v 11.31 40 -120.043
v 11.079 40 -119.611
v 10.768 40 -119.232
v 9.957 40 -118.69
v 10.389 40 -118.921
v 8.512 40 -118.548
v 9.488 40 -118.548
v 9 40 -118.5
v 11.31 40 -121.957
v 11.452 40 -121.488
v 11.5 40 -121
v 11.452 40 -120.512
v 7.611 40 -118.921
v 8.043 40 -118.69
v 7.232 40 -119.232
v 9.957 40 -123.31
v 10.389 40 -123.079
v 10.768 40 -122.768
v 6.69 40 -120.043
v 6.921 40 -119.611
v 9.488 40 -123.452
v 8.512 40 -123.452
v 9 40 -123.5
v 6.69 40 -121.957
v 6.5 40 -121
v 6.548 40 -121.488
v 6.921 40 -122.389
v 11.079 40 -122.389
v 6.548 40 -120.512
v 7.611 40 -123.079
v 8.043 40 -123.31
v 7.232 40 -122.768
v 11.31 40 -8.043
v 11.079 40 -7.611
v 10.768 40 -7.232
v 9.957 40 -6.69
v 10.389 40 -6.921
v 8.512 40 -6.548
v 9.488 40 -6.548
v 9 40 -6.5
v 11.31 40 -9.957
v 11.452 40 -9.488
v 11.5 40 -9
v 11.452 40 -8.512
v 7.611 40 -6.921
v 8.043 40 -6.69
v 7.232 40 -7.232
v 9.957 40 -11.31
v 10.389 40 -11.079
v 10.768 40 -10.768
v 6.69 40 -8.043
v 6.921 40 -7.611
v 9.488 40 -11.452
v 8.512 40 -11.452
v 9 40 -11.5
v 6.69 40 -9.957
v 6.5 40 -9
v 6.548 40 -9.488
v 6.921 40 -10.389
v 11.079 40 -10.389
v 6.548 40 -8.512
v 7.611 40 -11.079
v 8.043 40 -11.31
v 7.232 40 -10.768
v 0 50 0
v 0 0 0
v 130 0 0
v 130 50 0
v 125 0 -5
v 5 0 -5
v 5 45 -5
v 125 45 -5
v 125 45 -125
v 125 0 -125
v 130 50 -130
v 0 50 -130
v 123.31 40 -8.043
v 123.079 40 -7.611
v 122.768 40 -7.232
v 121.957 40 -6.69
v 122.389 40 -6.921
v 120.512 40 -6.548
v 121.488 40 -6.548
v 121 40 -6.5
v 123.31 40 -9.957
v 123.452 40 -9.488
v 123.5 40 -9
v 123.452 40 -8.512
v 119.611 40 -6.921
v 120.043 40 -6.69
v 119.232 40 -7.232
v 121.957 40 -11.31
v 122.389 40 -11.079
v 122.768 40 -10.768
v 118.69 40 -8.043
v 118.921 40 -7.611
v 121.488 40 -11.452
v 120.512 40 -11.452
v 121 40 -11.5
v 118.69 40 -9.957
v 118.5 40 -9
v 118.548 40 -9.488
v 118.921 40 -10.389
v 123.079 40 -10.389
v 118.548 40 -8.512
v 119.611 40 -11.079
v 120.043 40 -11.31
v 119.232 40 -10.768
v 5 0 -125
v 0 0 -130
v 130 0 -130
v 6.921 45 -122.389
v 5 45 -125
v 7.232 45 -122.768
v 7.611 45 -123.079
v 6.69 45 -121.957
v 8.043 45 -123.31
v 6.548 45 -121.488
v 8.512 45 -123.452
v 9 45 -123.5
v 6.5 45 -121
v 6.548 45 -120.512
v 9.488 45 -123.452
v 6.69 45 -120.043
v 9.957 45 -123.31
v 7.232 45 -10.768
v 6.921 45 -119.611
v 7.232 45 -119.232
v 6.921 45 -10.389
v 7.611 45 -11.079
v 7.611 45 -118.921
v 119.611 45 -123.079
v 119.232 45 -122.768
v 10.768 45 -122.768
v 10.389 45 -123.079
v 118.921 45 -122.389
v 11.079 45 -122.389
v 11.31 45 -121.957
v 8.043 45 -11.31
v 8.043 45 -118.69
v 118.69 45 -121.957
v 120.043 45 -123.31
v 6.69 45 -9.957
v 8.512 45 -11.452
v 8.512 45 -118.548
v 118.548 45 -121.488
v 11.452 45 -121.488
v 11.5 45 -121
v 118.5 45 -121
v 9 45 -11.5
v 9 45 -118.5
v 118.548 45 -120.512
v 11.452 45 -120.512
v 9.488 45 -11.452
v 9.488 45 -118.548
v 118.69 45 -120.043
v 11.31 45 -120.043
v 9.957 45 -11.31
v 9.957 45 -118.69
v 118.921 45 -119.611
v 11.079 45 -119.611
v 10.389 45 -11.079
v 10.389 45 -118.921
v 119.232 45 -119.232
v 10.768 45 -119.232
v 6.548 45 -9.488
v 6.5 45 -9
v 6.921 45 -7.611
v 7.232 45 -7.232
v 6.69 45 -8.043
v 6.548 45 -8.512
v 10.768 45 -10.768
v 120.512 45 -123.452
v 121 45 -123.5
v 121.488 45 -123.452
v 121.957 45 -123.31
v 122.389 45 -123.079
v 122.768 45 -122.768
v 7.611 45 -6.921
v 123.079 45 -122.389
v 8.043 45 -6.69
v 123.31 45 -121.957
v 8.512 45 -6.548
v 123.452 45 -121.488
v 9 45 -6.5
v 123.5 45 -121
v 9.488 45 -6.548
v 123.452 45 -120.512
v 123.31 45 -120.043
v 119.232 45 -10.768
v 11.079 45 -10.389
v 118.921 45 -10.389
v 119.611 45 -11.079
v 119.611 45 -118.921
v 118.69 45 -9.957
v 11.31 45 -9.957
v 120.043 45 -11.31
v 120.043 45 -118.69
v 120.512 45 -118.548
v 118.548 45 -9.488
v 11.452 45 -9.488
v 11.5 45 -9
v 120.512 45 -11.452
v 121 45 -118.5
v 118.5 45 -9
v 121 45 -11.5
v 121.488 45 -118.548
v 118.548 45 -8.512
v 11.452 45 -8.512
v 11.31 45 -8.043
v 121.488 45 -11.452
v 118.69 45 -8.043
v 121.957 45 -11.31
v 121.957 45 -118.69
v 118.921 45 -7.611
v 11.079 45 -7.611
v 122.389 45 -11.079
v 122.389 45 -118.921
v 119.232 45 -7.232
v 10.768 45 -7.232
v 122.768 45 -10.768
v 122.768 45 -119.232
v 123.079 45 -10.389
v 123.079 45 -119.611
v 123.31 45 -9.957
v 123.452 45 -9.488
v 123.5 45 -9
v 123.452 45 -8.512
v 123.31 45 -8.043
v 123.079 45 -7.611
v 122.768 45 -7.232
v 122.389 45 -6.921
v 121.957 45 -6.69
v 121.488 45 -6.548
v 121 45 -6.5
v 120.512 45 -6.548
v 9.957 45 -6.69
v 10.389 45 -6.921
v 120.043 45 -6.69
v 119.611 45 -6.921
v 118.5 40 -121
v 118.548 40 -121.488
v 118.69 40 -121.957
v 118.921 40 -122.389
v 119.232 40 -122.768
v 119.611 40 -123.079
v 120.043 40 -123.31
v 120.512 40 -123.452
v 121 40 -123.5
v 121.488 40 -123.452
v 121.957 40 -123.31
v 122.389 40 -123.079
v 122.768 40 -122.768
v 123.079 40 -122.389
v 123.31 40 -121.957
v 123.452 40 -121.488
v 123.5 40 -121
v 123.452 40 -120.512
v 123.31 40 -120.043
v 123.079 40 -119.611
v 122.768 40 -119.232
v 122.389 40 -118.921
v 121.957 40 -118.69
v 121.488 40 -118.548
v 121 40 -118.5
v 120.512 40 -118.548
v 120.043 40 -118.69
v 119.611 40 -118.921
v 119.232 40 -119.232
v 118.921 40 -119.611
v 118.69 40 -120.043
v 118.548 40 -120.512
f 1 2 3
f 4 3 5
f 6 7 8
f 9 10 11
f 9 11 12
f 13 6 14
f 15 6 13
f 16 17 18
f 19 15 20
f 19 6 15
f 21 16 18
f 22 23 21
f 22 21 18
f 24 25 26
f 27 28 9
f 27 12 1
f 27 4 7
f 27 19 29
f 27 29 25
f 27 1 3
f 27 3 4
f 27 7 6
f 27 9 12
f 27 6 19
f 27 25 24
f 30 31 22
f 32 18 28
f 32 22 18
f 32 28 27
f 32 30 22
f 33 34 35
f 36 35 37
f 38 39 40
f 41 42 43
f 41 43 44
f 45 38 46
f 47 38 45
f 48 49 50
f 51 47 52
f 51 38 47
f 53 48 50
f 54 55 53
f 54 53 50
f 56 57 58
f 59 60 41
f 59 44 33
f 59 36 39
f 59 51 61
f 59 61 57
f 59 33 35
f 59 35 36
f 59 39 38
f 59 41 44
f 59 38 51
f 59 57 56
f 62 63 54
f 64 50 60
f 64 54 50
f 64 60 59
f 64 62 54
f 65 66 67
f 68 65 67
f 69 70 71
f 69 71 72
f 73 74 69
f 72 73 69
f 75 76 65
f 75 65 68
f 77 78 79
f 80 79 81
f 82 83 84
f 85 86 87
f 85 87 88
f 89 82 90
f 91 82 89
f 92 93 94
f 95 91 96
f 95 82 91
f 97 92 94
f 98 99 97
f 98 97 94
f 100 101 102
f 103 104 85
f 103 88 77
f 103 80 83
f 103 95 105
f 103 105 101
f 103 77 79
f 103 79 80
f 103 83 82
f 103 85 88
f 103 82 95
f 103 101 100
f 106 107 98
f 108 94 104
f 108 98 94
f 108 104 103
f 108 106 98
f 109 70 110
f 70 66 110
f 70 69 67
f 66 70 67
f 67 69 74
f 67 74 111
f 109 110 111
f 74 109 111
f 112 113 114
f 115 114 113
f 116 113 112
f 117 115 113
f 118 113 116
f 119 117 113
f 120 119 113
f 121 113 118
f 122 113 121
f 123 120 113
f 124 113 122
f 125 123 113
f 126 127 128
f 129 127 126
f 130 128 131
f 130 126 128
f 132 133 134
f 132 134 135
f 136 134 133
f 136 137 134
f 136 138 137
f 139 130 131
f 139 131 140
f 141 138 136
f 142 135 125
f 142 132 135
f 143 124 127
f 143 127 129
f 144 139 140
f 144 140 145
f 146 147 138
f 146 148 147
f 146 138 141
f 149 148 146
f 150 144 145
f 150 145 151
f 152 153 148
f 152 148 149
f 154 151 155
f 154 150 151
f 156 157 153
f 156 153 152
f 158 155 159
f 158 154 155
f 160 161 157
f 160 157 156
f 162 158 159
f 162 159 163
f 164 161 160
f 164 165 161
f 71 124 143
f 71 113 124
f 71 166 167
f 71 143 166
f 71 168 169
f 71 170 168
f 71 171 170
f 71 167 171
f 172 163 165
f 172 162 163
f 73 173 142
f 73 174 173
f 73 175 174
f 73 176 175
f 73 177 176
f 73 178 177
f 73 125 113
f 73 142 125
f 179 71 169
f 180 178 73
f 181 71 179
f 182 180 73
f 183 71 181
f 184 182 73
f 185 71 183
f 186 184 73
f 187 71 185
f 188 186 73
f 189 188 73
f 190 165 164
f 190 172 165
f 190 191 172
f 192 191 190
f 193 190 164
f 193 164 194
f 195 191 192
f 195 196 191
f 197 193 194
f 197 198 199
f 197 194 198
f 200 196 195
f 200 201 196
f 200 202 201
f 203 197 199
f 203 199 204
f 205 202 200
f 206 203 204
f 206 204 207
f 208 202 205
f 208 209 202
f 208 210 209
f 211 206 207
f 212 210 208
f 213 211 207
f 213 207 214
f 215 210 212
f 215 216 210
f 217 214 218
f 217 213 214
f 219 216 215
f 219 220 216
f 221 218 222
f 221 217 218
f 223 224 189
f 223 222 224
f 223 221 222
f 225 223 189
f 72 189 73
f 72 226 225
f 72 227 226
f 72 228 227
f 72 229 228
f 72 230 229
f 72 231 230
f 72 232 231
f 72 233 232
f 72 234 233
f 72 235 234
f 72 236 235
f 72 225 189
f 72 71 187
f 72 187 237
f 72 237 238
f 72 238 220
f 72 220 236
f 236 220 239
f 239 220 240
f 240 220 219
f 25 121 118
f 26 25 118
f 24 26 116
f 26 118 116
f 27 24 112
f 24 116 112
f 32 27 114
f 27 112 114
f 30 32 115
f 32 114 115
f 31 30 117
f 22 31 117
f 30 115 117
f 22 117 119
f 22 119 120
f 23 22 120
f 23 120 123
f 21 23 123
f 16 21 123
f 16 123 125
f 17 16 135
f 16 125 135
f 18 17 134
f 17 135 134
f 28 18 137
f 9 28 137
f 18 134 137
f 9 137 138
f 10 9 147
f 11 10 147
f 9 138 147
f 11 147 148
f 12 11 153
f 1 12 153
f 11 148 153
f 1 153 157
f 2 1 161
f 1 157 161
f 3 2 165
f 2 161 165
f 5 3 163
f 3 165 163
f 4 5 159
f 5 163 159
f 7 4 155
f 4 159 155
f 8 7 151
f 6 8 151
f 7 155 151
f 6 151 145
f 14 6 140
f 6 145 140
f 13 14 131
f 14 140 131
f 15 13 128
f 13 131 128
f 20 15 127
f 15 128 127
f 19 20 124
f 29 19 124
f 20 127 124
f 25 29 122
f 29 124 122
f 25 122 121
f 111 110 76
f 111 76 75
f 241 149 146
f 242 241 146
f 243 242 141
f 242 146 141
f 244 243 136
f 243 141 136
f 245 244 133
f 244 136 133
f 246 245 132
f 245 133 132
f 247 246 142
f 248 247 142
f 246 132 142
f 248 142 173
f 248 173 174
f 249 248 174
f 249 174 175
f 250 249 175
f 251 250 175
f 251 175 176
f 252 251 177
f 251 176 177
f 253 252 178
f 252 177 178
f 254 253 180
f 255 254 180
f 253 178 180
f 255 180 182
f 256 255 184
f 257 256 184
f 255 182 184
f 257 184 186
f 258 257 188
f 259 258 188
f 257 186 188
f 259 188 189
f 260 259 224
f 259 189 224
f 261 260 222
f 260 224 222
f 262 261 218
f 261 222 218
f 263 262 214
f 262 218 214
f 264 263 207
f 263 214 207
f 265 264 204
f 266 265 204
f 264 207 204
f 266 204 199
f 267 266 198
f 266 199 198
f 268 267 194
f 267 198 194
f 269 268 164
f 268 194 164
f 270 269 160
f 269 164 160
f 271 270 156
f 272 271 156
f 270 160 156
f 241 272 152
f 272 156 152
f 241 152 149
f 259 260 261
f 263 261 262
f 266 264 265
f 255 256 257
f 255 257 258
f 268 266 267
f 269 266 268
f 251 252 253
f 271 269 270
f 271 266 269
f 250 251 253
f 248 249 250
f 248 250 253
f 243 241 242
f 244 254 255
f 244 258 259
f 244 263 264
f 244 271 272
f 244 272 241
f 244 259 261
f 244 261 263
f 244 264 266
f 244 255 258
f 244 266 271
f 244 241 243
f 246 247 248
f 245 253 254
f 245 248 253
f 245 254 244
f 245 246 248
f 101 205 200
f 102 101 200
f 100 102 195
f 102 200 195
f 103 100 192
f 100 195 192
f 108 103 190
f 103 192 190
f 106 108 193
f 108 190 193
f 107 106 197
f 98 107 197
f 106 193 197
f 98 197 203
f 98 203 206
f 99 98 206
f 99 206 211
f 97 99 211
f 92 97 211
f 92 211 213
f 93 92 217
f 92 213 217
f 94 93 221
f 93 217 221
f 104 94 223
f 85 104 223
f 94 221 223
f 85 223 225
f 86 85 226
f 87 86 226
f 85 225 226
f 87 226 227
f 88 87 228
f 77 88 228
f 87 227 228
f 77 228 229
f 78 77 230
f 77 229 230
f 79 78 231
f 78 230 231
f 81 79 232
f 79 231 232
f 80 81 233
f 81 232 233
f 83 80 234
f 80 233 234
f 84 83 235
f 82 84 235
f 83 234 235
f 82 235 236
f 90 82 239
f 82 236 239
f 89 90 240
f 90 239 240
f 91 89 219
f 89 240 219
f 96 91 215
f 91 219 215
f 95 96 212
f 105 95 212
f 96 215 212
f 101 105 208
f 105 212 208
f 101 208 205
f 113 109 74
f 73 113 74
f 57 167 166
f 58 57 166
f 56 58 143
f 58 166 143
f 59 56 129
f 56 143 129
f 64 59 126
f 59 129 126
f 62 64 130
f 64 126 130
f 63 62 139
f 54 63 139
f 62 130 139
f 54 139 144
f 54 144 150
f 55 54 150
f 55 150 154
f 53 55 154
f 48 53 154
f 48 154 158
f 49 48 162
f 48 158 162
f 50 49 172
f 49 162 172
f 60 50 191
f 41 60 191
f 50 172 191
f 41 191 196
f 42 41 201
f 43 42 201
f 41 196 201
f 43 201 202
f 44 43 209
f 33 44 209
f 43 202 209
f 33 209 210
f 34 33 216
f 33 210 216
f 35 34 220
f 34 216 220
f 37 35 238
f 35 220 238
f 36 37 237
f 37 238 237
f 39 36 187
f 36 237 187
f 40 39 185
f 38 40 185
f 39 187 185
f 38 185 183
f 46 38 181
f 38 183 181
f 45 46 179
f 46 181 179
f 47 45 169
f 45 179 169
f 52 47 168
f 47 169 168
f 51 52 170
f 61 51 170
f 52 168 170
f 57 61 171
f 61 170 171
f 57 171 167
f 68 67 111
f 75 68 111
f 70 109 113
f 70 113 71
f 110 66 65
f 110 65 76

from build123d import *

# Parameters (mm, degrees)
SKETCH1_W           = 130
SKETCH1_H           = 130
BOSS_EXTRUDE1_DEPTH = 50
SKETCH2_W           = 120
SKETCH2_H           = 120
CUT_EXTRUDE1_DEPTH  = 45
SKETCH3_R           = 2.5
BOSS_EXTRUDE2_DEPTH = 5


with BuildPart() as part:
    # Sketch1 → Boss-Extrude1 (new body)
    with BuildSketch(Plane(origin=(0, 0, 0), x_dir=(1, 0, 0), z_dir=(0, 1, 0))):
        with Locations((65, 65)):
            Rectangle(SKETCH1_W, SKETCH1_H)
    extrude(amount=BOSS_EXTRUDE1_DEPTH)

    # Sketch2 → Cut-Extrude1 (cut)
    with BuildSketch(Plane.XZ):
        with Locations((65, -65)):
            Rectangle(SKETCH2_W, SKETCH2_H)
    extrude(amount=-CUT_EXTRUDE1_DEPTH, mode=Mode.SUBTRACT)

    # Sketch3 → Boss-Extrude2 (add)
    with BuildSketch(Plane(origin=(0, 45, 0), x_dir=(-1, 0, 0), z_dir=(0, -1, 0))):
        with Locations((-9, 121)):
            Circle(SKETCH3_R)
        with Locations((-121, 121)):
            Circle(SKETCH3_R)
        with Locations((-9, 9)):
            Circle(SKETCH3_R)
        with Locations((-121, 9)):
            Circle(SKETCH3_R)
    extrude(amount=BOSS_EXTRUDE2_DEPTH)


solid = part.part
